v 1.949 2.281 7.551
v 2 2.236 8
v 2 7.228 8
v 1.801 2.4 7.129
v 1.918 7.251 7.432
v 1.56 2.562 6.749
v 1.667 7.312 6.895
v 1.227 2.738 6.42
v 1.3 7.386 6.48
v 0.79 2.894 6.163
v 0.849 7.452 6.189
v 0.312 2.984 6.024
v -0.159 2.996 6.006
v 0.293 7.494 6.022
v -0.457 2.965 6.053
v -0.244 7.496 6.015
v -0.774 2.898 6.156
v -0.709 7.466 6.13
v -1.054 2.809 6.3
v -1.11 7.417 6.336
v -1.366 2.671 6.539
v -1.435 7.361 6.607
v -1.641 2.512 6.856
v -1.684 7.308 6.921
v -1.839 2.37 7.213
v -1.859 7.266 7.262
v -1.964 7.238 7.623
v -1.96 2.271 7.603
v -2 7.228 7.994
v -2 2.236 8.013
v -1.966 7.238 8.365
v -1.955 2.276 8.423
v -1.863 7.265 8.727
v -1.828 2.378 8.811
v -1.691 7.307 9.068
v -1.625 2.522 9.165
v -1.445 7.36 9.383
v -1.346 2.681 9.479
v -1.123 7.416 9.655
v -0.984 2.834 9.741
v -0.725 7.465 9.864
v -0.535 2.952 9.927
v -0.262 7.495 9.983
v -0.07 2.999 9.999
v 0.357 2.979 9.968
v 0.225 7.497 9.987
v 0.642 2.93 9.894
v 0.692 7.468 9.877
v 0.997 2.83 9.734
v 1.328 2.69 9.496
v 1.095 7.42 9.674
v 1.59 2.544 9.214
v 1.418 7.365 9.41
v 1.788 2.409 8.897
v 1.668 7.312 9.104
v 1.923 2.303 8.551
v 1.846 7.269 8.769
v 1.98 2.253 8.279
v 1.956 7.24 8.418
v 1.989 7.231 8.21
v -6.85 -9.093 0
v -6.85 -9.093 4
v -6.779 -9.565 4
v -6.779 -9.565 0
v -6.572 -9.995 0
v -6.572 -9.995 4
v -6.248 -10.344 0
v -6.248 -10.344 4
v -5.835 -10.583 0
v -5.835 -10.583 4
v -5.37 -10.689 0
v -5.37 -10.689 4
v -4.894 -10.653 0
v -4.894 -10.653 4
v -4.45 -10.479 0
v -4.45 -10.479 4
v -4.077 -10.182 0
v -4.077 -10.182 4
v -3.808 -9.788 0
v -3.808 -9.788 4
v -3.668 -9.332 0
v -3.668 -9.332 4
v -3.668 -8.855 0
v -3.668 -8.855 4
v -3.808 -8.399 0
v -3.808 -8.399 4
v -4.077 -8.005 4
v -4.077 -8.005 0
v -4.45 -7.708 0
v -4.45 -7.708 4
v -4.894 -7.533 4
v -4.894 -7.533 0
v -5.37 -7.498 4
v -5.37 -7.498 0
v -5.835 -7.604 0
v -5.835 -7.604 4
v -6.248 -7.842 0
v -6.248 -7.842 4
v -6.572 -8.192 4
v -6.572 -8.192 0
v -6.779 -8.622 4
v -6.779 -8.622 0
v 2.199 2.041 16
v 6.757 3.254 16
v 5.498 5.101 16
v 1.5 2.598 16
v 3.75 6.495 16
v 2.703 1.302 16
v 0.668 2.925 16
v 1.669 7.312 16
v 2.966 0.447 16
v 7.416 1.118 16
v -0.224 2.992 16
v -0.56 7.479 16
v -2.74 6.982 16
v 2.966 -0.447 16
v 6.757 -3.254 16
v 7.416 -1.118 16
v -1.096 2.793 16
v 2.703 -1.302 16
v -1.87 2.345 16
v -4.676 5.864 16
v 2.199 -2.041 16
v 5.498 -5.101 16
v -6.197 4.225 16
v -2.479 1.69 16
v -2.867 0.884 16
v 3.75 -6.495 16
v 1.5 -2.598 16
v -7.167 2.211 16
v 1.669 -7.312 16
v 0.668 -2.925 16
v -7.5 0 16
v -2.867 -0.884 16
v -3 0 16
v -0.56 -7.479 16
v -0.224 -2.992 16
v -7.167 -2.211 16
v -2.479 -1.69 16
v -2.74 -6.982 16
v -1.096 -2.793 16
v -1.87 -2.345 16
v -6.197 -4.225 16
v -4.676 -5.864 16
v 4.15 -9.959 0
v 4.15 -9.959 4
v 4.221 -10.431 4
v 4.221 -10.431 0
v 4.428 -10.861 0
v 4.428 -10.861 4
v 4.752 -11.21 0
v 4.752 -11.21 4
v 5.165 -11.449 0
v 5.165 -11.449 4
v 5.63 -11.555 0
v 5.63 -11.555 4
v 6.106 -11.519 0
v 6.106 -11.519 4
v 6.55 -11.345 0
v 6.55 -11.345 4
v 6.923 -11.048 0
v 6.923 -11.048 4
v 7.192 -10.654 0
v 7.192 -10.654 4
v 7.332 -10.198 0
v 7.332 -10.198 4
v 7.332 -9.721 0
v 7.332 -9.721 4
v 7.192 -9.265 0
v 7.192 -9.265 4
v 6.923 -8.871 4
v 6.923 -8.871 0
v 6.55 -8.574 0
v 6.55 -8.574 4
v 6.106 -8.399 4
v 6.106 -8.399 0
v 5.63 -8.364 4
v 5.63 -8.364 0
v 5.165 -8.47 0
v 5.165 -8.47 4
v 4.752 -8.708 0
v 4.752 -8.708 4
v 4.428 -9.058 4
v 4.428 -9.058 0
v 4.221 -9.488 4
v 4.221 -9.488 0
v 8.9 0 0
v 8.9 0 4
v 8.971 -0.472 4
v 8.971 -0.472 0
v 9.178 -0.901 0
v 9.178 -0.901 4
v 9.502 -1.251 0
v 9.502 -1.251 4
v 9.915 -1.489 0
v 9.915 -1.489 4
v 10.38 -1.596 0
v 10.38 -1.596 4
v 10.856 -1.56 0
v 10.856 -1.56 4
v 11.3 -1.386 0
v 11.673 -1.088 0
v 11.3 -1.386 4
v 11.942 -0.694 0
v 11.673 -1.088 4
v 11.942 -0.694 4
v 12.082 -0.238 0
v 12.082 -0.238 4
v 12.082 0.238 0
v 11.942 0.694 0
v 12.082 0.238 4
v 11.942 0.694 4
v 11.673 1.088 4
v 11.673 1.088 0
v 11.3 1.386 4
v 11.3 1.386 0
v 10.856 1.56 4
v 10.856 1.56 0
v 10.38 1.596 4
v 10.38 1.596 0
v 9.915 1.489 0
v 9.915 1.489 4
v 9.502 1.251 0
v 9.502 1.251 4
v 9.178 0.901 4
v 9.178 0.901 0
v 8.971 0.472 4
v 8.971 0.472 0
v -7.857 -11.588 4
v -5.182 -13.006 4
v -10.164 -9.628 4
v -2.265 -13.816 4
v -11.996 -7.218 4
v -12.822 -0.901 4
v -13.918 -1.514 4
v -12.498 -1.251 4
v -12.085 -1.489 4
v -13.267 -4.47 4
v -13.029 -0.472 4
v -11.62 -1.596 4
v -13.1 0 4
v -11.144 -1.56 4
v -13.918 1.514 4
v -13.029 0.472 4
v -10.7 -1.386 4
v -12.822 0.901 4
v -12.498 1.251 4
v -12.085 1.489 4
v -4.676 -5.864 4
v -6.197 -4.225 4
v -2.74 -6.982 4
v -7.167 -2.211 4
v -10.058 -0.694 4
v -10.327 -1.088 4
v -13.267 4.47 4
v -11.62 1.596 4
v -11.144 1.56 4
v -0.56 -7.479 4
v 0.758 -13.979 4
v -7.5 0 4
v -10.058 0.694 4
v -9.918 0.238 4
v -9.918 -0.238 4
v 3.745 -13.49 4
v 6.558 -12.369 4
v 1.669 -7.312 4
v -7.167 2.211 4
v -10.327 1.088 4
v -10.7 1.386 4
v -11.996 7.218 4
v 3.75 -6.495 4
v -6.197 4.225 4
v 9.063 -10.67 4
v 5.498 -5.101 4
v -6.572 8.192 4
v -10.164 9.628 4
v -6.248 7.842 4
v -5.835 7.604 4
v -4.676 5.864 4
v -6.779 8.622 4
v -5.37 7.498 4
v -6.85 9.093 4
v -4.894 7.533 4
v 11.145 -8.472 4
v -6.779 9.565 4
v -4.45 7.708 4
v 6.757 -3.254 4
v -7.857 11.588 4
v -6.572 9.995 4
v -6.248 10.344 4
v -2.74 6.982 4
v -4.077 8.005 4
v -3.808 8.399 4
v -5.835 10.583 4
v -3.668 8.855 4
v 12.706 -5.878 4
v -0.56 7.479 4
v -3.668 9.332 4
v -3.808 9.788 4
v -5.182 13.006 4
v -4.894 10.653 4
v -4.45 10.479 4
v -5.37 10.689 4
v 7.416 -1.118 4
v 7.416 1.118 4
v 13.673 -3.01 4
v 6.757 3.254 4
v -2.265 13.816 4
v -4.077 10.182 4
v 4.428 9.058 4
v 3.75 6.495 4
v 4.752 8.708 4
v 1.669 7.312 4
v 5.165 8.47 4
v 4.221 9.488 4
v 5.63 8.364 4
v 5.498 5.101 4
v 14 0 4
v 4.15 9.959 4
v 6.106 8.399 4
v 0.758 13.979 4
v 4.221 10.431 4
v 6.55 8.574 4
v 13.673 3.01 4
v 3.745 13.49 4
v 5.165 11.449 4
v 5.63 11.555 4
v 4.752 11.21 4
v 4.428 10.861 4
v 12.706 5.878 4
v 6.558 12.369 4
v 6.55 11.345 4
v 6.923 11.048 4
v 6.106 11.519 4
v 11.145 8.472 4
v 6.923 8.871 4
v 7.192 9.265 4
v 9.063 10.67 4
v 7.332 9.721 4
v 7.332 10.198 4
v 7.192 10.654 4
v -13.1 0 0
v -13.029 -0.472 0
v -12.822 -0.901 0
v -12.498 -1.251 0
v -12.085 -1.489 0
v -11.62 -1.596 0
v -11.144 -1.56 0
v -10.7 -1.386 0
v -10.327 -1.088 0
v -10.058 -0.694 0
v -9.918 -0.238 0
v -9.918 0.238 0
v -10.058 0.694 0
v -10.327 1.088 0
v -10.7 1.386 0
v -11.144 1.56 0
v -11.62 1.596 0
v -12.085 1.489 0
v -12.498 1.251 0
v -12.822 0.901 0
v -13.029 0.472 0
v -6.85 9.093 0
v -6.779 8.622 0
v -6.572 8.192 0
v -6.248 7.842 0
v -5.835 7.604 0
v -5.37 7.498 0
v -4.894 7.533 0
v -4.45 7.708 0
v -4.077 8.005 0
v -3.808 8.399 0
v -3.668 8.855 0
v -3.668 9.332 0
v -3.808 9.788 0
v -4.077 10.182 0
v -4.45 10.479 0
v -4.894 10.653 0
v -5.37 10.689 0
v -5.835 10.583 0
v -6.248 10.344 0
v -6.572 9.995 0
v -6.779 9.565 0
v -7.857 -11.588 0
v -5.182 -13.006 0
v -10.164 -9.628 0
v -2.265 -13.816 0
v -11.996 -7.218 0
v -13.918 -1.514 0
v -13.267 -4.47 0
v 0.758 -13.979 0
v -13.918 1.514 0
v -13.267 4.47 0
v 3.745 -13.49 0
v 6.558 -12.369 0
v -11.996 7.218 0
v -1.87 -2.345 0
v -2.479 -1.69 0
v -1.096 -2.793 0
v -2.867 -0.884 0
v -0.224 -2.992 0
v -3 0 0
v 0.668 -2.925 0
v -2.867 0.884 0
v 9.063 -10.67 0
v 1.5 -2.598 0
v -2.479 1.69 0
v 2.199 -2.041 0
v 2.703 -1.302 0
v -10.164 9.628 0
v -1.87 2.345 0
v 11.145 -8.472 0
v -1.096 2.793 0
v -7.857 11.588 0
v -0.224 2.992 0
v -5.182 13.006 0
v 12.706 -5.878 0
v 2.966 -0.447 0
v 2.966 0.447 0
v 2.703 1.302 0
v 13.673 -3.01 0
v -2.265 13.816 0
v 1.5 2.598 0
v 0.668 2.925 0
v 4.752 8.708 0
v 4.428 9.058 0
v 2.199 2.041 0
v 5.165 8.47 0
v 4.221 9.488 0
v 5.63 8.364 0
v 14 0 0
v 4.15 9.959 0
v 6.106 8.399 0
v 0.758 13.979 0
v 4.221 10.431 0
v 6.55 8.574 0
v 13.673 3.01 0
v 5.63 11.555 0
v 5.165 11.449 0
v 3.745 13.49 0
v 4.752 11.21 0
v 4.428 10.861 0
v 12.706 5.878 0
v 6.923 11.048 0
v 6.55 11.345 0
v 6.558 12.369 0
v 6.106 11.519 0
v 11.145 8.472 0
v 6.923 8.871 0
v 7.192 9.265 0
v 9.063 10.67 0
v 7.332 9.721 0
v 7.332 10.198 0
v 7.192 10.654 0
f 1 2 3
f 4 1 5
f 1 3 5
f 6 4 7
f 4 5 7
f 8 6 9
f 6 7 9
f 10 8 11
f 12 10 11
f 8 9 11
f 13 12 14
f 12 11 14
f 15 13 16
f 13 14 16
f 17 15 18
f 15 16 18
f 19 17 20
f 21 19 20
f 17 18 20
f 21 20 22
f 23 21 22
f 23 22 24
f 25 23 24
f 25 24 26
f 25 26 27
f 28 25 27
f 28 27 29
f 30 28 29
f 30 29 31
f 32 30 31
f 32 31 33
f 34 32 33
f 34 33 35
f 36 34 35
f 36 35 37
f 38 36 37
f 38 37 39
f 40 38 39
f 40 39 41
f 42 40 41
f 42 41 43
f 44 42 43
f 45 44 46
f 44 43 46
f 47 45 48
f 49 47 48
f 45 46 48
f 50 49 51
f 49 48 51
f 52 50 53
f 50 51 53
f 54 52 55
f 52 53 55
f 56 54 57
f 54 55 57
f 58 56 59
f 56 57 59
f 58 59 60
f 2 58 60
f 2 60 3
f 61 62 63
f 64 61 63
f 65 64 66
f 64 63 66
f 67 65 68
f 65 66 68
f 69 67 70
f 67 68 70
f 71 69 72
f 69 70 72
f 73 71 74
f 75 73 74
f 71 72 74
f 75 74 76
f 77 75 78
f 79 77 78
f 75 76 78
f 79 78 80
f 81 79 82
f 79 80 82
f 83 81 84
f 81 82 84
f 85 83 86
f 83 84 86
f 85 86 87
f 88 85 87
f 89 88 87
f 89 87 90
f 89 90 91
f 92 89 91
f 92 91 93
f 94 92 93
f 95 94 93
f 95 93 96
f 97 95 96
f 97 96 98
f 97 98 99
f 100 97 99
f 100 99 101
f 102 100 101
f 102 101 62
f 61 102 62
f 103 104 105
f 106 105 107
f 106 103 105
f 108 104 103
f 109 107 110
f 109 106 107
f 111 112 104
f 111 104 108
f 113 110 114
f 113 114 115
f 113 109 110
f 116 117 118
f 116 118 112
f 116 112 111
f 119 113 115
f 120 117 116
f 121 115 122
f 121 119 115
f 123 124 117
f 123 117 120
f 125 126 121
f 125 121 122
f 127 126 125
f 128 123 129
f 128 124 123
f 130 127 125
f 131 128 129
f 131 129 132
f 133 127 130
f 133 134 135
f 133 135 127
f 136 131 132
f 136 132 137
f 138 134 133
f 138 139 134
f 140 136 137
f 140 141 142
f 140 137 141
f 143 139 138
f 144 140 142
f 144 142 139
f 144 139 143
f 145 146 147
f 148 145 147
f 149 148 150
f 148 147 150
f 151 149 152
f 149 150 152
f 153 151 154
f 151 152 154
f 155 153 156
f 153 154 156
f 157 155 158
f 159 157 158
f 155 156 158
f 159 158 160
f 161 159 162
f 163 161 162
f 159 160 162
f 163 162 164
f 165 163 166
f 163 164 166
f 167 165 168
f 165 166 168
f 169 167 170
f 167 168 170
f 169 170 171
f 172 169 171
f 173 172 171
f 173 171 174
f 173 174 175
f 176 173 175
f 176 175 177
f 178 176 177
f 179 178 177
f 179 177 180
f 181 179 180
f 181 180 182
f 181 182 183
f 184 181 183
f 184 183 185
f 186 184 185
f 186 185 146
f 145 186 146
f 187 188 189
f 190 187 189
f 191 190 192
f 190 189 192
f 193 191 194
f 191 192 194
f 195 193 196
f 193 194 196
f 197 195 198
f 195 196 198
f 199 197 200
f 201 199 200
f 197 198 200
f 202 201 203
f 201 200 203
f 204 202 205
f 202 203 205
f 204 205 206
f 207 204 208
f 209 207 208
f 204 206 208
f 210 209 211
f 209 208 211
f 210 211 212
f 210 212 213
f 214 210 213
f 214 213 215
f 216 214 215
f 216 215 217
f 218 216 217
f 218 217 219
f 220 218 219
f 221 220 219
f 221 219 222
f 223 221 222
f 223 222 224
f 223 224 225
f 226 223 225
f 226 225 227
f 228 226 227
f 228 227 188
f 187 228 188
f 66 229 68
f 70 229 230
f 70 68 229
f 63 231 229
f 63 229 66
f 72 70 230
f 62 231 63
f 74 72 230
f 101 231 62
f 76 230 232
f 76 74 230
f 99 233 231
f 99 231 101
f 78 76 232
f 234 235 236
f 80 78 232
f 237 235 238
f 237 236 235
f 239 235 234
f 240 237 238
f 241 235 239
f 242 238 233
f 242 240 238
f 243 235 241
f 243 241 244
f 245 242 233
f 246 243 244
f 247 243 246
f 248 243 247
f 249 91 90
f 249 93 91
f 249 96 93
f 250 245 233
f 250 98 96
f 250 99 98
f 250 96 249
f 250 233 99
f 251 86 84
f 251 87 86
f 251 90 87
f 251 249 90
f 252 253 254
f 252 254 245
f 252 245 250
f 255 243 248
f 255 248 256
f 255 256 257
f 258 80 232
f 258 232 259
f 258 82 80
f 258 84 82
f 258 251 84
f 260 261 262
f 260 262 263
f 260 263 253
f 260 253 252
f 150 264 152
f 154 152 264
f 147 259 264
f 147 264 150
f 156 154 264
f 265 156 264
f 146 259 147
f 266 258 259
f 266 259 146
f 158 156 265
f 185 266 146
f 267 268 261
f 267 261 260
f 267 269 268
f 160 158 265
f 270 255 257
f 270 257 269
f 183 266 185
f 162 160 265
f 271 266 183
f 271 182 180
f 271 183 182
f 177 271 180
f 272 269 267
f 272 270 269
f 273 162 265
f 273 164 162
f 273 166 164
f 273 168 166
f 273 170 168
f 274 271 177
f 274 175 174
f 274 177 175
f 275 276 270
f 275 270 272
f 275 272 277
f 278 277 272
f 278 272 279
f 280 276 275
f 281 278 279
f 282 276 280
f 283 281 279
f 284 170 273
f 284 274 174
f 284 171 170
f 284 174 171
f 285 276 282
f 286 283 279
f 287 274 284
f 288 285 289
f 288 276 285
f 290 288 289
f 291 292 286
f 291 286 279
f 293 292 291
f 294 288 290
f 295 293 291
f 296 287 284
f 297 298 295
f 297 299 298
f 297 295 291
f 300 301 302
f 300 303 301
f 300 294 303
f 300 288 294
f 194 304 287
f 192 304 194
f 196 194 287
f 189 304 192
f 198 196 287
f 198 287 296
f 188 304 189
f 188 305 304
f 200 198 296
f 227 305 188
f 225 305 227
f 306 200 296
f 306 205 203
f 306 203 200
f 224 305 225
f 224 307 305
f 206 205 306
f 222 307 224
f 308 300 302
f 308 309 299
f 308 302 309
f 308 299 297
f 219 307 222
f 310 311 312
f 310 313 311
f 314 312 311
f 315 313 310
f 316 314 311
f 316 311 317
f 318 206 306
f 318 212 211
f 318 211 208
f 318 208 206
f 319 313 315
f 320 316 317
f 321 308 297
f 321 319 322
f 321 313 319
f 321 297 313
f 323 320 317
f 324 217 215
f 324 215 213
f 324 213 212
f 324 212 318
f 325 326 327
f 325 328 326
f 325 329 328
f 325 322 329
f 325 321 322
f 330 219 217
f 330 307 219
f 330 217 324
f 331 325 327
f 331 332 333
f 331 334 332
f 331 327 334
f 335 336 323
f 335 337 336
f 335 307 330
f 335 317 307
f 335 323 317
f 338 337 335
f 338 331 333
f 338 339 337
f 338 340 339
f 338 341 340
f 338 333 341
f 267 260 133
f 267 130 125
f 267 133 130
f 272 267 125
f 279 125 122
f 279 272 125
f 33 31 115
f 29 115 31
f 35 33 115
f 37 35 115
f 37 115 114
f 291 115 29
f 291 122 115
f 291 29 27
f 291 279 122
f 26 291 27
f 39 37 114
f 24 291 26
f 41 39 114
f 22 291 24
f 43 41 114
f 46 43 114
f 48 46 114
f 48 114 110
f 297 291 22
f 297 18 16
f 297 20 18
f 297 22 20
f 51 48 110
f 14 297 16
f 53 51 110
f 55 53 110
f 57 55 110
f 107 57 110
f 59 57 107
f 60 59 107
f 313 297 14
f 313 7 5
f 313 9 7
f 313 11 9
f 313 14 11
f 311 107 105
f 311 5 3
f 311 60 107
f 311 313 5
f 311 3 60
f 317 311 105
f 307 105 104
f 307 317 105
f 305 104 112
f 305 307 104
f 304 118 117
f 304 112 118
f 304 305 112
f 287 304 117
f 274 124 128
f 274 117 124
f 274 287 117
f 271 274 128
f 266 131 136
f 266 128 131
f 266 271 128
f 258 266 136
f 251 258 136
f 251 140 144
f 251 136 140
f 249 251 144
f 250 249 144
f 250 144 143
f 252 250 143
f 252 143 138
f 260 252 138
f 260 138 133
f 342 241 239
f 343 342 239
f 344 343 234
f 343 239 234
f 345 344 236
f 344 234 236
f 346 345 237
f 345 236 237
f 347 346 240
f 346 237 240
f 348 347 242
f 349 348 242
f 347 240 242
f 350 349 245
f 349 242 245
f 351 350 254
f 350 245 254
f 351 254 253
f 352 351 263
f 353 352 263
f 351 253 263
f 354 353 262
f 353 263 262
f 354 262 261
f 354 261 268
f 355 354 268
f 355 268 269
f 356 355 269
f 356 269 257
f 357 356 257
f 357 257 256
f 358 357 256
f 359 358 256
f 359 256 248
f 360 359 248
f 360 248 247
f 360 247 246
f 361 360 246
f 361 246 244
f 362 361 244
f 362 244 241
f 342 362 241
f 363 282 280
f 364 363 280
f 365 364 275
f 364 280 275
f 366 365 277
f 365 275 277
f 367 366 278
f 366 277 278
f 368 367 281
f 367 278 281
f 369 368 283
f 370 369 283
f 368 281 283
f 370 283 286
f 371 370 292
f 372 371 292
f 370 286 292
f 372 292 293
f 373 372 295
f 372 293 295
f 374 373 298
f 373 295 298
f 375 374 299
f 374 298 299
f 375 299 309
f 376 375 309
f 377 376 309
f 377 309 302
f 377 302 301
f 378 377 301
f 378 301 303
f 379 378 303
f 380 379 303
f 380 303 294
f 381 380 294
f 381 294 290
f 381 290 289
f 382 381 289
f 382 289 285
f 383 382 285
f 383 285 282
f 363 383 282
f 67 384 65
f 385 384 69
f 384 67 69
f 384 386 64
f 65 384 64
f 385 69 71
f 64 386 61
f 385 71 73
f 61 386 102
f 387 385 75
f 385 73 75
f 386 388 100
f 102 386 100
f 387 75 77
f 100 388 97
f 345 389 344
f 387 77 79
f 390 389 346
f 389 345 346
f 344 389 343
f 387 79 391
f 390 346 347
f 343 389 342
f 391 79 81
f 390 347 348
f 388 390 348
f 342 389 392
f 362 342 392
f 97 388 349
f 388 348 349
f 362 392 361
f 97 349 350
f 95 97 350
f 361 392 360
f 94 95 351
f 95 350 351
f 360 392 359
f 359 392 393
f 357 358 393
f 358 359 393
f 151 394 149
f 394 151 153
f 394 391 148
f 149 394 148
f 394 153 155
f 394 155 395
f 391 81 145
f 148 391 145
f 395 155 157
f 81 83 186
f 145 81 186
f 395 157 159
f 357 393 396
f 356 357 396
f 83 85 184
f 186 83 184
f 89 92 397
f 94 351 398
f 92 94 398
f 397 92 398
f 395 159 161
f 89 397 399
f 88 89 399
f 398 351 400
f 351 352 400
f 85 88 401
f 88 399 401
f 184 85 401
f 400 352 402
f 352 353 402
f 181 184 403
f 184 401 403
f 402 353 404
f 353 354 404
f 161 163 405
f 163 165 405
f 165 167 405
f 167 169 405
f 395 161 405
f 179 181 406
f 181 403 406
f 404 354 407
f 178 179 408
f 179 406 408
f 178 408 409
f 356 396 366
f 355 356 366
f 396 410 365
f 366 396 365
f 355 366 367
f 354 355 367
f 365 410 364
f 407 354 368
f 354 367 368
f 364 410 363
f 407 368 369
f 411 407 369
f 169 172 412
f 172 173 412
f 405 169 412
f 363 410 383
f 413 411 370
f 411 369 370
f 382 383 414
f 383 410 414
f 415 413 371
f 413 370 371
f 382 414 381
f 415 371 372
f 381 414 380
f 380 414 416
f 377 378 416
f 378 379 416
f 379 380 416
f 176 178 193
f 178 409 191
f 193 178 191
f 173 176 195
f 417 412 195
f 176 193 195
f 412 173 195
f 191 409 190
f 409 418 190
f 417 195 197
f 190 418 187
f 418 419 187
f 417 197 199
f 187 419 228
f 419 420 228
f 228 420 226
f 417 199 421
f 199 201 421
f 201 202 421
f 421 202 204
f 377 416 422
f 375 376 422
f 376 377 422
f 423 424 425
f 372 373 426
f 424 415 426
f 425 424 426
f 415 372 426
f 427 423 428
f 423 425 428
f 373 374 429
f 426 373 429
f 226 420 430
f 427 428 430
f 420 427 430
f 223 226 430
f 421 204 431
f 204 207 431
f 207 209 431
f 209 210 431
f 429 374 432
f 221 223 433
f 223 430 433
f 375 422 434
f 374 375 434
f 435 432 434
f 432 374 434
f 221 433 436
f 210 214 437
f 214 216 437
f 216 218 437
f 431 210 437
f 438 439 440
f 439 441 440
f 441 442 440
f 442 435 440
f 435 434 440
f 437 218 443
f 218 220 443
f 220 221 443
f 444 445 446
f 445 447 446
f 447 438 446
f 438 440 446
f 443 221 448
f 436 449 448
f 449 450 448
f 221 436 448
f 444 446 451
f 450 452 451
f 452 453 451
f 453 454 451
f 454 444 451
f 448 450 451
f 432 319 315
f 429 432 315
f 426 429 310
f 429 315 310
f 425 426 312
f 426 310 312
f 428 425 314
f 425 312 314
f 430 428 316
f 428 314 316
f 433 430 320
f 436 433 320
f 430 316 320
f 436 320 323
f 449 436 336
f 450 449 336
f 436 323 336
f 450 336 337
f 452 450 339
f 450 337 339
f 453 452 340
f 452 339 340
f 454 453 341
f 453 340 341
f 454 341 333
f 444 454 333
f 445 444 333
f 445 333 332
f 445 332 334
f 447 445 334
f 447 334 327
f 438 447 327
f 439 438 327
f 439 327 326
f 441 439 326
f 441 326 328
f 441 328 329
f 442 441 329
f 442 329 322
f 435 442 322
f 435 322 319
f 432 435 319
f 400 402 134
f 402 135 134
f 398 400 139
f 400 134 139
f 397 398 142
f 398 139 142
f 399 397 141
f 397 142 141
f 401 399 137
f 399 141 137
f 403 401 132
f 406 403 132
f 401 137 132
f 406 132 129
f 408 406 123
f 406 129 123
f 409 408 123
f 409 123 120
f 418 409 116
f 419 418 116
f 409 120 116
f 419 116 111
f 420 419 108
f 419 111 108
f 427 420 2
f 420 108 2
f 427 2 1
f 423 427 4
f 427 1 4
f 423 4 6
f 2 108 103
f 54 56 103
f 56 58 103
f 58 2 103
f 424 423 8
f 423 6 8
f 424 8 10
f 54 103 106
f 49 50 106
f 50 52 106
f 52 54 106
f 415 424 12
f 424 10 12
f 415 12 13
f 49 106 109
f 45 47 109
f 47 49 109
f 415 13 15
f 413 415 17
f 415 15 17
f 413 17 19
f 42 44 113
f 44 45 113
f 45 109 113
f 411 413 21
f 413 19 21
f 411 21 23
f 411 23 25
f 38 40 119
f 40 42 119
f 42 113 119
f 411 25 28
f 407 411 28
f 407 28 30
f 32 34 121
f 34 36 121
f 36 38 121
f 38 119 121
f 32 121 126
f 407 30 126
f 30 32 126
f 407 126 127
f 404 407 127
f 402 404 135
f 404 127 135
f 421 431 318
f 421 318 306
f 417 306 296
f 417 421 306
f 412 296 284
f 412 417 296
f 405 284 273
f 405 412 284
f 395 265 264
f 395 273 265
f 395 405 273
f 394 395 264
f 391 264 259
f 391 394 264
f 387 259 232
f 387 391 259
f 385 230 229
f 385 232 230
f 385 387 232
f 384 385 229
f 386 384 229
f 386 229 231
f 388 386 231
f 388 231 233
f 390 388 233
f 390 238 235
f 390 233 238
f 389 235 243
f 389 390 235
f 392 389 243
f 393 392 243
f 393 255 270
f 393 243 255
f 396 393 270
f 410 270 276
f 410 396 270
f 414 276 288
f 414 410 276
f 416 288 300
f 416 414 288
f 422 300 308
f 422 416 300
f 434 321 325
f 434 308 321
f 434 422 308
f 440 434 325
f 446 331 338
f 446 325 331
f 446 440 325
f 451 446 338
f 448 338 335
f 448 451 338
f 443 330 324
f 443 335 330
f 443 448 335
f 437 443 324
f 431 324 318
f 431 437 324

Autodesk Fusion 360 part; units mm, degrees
sketch "草图1" plane through (0, 0, 0) normal (0, 0, 1) x (1, 0, 0)
  circle A0 centre (0, 0) radius 14
  dimension "d1" = 28
extrude "拉伸1" add sketch "草图1" along normal blind 4 makes body 1
sketch "草图2" plane through (0, 0, 4) normal (0, 0, 1) x (-1, 0, 0)
  circle A0 centre (0, 0) radius 14
  circle A1 centre (0, 0) radius 11.5 construction
  line L0 (13, 0) -> (-13, 0)
  circle A2 centre (11.5, 0) radius 1.6
  circle A3 centre (-5.75, 9.9593) radius 1.6
  circle A4 centre (-5.75, -9.9593) radius 1.6
  circle A5 centre (0, 0) radius 10.5 construction
  circle A6 centre (-10.5, 0) radius 1.6
  circle A7 centre (5.25, -9.0933) radius 1.6
  circle A8 centre (5.25, 9.0933) radius 1.6
  dimension "d4" = 23
  dimension "d5" = 3.2
  dimension "d7" = 360
  dimension "d8" = 21
  dimension "d9" = 3.2
  dimension "d11" = 360
extrude "拉伸2" cut sketch "草图2" against normal blind 4 contours L0 A6 | L0 A6 | A2 | A3 | A4 | A7 | A8 bodies 1
sketch "草图3" plane through (0, 0, 4) normal (0, 0, 1) x (-1, 0, 0)
  circle A0 centre (-5.75, -9.9593) radius 1.6
  circle A1 centre (11.5, 0) radius 1.6
  circle A2 centre (-10.5, 0) radius 1.6
  circle A3 centre (5.25, 9.0933) radius 1.6
  circle A4 centre (5.25, -9.0933) radius 1.6
  circle A5 centre (-5.75, 9.9593) radius 1.6
  circle A6 centre (0, 0) radius 14
  circle A7 centre (0, 0) radius 7.5
  dimension "d14" = 15
extrude "拉伸3" add sketch "草图3" along normal blind 12 contours A7 bodies 1
sketch "草图4" plane through (0, 0, 16) normal (0, 0, 1) x (-1, 0, 0)
  circle A0 centre (0, 0) radius 7.5
  circle A1 centre (0, 0) radius 3
  dimension "d17" = 6
extrude "拉伸4" cut sketch "草图4" against normal blind 16 contours A1 bodies 1
ref_plane "工作平面1" through (0, 8, 0) normal (0, 1, 0) x (0, 0, 1)
sketch "草图5" plane through (0, 8, 0) normal (0, 1, 0) x (1, 0, 0)
  line L0 (0, -14) -> (0, 7)
  circle A0 centre (0, -8) radius 2
  dimension "d21" = 4
  dimension "d22" = 8
extrude "拉伸5" cut sketch "草图5" against normal blind 8 bodies 1
copy_body "实体->零部件1" bodies 1 removing the originals makes body 2 in component "Component'"
component "Component'" placed x (1, 0, 0) y (0, 1, 0) z (0, 0, 1) at (0, 0, 0)
